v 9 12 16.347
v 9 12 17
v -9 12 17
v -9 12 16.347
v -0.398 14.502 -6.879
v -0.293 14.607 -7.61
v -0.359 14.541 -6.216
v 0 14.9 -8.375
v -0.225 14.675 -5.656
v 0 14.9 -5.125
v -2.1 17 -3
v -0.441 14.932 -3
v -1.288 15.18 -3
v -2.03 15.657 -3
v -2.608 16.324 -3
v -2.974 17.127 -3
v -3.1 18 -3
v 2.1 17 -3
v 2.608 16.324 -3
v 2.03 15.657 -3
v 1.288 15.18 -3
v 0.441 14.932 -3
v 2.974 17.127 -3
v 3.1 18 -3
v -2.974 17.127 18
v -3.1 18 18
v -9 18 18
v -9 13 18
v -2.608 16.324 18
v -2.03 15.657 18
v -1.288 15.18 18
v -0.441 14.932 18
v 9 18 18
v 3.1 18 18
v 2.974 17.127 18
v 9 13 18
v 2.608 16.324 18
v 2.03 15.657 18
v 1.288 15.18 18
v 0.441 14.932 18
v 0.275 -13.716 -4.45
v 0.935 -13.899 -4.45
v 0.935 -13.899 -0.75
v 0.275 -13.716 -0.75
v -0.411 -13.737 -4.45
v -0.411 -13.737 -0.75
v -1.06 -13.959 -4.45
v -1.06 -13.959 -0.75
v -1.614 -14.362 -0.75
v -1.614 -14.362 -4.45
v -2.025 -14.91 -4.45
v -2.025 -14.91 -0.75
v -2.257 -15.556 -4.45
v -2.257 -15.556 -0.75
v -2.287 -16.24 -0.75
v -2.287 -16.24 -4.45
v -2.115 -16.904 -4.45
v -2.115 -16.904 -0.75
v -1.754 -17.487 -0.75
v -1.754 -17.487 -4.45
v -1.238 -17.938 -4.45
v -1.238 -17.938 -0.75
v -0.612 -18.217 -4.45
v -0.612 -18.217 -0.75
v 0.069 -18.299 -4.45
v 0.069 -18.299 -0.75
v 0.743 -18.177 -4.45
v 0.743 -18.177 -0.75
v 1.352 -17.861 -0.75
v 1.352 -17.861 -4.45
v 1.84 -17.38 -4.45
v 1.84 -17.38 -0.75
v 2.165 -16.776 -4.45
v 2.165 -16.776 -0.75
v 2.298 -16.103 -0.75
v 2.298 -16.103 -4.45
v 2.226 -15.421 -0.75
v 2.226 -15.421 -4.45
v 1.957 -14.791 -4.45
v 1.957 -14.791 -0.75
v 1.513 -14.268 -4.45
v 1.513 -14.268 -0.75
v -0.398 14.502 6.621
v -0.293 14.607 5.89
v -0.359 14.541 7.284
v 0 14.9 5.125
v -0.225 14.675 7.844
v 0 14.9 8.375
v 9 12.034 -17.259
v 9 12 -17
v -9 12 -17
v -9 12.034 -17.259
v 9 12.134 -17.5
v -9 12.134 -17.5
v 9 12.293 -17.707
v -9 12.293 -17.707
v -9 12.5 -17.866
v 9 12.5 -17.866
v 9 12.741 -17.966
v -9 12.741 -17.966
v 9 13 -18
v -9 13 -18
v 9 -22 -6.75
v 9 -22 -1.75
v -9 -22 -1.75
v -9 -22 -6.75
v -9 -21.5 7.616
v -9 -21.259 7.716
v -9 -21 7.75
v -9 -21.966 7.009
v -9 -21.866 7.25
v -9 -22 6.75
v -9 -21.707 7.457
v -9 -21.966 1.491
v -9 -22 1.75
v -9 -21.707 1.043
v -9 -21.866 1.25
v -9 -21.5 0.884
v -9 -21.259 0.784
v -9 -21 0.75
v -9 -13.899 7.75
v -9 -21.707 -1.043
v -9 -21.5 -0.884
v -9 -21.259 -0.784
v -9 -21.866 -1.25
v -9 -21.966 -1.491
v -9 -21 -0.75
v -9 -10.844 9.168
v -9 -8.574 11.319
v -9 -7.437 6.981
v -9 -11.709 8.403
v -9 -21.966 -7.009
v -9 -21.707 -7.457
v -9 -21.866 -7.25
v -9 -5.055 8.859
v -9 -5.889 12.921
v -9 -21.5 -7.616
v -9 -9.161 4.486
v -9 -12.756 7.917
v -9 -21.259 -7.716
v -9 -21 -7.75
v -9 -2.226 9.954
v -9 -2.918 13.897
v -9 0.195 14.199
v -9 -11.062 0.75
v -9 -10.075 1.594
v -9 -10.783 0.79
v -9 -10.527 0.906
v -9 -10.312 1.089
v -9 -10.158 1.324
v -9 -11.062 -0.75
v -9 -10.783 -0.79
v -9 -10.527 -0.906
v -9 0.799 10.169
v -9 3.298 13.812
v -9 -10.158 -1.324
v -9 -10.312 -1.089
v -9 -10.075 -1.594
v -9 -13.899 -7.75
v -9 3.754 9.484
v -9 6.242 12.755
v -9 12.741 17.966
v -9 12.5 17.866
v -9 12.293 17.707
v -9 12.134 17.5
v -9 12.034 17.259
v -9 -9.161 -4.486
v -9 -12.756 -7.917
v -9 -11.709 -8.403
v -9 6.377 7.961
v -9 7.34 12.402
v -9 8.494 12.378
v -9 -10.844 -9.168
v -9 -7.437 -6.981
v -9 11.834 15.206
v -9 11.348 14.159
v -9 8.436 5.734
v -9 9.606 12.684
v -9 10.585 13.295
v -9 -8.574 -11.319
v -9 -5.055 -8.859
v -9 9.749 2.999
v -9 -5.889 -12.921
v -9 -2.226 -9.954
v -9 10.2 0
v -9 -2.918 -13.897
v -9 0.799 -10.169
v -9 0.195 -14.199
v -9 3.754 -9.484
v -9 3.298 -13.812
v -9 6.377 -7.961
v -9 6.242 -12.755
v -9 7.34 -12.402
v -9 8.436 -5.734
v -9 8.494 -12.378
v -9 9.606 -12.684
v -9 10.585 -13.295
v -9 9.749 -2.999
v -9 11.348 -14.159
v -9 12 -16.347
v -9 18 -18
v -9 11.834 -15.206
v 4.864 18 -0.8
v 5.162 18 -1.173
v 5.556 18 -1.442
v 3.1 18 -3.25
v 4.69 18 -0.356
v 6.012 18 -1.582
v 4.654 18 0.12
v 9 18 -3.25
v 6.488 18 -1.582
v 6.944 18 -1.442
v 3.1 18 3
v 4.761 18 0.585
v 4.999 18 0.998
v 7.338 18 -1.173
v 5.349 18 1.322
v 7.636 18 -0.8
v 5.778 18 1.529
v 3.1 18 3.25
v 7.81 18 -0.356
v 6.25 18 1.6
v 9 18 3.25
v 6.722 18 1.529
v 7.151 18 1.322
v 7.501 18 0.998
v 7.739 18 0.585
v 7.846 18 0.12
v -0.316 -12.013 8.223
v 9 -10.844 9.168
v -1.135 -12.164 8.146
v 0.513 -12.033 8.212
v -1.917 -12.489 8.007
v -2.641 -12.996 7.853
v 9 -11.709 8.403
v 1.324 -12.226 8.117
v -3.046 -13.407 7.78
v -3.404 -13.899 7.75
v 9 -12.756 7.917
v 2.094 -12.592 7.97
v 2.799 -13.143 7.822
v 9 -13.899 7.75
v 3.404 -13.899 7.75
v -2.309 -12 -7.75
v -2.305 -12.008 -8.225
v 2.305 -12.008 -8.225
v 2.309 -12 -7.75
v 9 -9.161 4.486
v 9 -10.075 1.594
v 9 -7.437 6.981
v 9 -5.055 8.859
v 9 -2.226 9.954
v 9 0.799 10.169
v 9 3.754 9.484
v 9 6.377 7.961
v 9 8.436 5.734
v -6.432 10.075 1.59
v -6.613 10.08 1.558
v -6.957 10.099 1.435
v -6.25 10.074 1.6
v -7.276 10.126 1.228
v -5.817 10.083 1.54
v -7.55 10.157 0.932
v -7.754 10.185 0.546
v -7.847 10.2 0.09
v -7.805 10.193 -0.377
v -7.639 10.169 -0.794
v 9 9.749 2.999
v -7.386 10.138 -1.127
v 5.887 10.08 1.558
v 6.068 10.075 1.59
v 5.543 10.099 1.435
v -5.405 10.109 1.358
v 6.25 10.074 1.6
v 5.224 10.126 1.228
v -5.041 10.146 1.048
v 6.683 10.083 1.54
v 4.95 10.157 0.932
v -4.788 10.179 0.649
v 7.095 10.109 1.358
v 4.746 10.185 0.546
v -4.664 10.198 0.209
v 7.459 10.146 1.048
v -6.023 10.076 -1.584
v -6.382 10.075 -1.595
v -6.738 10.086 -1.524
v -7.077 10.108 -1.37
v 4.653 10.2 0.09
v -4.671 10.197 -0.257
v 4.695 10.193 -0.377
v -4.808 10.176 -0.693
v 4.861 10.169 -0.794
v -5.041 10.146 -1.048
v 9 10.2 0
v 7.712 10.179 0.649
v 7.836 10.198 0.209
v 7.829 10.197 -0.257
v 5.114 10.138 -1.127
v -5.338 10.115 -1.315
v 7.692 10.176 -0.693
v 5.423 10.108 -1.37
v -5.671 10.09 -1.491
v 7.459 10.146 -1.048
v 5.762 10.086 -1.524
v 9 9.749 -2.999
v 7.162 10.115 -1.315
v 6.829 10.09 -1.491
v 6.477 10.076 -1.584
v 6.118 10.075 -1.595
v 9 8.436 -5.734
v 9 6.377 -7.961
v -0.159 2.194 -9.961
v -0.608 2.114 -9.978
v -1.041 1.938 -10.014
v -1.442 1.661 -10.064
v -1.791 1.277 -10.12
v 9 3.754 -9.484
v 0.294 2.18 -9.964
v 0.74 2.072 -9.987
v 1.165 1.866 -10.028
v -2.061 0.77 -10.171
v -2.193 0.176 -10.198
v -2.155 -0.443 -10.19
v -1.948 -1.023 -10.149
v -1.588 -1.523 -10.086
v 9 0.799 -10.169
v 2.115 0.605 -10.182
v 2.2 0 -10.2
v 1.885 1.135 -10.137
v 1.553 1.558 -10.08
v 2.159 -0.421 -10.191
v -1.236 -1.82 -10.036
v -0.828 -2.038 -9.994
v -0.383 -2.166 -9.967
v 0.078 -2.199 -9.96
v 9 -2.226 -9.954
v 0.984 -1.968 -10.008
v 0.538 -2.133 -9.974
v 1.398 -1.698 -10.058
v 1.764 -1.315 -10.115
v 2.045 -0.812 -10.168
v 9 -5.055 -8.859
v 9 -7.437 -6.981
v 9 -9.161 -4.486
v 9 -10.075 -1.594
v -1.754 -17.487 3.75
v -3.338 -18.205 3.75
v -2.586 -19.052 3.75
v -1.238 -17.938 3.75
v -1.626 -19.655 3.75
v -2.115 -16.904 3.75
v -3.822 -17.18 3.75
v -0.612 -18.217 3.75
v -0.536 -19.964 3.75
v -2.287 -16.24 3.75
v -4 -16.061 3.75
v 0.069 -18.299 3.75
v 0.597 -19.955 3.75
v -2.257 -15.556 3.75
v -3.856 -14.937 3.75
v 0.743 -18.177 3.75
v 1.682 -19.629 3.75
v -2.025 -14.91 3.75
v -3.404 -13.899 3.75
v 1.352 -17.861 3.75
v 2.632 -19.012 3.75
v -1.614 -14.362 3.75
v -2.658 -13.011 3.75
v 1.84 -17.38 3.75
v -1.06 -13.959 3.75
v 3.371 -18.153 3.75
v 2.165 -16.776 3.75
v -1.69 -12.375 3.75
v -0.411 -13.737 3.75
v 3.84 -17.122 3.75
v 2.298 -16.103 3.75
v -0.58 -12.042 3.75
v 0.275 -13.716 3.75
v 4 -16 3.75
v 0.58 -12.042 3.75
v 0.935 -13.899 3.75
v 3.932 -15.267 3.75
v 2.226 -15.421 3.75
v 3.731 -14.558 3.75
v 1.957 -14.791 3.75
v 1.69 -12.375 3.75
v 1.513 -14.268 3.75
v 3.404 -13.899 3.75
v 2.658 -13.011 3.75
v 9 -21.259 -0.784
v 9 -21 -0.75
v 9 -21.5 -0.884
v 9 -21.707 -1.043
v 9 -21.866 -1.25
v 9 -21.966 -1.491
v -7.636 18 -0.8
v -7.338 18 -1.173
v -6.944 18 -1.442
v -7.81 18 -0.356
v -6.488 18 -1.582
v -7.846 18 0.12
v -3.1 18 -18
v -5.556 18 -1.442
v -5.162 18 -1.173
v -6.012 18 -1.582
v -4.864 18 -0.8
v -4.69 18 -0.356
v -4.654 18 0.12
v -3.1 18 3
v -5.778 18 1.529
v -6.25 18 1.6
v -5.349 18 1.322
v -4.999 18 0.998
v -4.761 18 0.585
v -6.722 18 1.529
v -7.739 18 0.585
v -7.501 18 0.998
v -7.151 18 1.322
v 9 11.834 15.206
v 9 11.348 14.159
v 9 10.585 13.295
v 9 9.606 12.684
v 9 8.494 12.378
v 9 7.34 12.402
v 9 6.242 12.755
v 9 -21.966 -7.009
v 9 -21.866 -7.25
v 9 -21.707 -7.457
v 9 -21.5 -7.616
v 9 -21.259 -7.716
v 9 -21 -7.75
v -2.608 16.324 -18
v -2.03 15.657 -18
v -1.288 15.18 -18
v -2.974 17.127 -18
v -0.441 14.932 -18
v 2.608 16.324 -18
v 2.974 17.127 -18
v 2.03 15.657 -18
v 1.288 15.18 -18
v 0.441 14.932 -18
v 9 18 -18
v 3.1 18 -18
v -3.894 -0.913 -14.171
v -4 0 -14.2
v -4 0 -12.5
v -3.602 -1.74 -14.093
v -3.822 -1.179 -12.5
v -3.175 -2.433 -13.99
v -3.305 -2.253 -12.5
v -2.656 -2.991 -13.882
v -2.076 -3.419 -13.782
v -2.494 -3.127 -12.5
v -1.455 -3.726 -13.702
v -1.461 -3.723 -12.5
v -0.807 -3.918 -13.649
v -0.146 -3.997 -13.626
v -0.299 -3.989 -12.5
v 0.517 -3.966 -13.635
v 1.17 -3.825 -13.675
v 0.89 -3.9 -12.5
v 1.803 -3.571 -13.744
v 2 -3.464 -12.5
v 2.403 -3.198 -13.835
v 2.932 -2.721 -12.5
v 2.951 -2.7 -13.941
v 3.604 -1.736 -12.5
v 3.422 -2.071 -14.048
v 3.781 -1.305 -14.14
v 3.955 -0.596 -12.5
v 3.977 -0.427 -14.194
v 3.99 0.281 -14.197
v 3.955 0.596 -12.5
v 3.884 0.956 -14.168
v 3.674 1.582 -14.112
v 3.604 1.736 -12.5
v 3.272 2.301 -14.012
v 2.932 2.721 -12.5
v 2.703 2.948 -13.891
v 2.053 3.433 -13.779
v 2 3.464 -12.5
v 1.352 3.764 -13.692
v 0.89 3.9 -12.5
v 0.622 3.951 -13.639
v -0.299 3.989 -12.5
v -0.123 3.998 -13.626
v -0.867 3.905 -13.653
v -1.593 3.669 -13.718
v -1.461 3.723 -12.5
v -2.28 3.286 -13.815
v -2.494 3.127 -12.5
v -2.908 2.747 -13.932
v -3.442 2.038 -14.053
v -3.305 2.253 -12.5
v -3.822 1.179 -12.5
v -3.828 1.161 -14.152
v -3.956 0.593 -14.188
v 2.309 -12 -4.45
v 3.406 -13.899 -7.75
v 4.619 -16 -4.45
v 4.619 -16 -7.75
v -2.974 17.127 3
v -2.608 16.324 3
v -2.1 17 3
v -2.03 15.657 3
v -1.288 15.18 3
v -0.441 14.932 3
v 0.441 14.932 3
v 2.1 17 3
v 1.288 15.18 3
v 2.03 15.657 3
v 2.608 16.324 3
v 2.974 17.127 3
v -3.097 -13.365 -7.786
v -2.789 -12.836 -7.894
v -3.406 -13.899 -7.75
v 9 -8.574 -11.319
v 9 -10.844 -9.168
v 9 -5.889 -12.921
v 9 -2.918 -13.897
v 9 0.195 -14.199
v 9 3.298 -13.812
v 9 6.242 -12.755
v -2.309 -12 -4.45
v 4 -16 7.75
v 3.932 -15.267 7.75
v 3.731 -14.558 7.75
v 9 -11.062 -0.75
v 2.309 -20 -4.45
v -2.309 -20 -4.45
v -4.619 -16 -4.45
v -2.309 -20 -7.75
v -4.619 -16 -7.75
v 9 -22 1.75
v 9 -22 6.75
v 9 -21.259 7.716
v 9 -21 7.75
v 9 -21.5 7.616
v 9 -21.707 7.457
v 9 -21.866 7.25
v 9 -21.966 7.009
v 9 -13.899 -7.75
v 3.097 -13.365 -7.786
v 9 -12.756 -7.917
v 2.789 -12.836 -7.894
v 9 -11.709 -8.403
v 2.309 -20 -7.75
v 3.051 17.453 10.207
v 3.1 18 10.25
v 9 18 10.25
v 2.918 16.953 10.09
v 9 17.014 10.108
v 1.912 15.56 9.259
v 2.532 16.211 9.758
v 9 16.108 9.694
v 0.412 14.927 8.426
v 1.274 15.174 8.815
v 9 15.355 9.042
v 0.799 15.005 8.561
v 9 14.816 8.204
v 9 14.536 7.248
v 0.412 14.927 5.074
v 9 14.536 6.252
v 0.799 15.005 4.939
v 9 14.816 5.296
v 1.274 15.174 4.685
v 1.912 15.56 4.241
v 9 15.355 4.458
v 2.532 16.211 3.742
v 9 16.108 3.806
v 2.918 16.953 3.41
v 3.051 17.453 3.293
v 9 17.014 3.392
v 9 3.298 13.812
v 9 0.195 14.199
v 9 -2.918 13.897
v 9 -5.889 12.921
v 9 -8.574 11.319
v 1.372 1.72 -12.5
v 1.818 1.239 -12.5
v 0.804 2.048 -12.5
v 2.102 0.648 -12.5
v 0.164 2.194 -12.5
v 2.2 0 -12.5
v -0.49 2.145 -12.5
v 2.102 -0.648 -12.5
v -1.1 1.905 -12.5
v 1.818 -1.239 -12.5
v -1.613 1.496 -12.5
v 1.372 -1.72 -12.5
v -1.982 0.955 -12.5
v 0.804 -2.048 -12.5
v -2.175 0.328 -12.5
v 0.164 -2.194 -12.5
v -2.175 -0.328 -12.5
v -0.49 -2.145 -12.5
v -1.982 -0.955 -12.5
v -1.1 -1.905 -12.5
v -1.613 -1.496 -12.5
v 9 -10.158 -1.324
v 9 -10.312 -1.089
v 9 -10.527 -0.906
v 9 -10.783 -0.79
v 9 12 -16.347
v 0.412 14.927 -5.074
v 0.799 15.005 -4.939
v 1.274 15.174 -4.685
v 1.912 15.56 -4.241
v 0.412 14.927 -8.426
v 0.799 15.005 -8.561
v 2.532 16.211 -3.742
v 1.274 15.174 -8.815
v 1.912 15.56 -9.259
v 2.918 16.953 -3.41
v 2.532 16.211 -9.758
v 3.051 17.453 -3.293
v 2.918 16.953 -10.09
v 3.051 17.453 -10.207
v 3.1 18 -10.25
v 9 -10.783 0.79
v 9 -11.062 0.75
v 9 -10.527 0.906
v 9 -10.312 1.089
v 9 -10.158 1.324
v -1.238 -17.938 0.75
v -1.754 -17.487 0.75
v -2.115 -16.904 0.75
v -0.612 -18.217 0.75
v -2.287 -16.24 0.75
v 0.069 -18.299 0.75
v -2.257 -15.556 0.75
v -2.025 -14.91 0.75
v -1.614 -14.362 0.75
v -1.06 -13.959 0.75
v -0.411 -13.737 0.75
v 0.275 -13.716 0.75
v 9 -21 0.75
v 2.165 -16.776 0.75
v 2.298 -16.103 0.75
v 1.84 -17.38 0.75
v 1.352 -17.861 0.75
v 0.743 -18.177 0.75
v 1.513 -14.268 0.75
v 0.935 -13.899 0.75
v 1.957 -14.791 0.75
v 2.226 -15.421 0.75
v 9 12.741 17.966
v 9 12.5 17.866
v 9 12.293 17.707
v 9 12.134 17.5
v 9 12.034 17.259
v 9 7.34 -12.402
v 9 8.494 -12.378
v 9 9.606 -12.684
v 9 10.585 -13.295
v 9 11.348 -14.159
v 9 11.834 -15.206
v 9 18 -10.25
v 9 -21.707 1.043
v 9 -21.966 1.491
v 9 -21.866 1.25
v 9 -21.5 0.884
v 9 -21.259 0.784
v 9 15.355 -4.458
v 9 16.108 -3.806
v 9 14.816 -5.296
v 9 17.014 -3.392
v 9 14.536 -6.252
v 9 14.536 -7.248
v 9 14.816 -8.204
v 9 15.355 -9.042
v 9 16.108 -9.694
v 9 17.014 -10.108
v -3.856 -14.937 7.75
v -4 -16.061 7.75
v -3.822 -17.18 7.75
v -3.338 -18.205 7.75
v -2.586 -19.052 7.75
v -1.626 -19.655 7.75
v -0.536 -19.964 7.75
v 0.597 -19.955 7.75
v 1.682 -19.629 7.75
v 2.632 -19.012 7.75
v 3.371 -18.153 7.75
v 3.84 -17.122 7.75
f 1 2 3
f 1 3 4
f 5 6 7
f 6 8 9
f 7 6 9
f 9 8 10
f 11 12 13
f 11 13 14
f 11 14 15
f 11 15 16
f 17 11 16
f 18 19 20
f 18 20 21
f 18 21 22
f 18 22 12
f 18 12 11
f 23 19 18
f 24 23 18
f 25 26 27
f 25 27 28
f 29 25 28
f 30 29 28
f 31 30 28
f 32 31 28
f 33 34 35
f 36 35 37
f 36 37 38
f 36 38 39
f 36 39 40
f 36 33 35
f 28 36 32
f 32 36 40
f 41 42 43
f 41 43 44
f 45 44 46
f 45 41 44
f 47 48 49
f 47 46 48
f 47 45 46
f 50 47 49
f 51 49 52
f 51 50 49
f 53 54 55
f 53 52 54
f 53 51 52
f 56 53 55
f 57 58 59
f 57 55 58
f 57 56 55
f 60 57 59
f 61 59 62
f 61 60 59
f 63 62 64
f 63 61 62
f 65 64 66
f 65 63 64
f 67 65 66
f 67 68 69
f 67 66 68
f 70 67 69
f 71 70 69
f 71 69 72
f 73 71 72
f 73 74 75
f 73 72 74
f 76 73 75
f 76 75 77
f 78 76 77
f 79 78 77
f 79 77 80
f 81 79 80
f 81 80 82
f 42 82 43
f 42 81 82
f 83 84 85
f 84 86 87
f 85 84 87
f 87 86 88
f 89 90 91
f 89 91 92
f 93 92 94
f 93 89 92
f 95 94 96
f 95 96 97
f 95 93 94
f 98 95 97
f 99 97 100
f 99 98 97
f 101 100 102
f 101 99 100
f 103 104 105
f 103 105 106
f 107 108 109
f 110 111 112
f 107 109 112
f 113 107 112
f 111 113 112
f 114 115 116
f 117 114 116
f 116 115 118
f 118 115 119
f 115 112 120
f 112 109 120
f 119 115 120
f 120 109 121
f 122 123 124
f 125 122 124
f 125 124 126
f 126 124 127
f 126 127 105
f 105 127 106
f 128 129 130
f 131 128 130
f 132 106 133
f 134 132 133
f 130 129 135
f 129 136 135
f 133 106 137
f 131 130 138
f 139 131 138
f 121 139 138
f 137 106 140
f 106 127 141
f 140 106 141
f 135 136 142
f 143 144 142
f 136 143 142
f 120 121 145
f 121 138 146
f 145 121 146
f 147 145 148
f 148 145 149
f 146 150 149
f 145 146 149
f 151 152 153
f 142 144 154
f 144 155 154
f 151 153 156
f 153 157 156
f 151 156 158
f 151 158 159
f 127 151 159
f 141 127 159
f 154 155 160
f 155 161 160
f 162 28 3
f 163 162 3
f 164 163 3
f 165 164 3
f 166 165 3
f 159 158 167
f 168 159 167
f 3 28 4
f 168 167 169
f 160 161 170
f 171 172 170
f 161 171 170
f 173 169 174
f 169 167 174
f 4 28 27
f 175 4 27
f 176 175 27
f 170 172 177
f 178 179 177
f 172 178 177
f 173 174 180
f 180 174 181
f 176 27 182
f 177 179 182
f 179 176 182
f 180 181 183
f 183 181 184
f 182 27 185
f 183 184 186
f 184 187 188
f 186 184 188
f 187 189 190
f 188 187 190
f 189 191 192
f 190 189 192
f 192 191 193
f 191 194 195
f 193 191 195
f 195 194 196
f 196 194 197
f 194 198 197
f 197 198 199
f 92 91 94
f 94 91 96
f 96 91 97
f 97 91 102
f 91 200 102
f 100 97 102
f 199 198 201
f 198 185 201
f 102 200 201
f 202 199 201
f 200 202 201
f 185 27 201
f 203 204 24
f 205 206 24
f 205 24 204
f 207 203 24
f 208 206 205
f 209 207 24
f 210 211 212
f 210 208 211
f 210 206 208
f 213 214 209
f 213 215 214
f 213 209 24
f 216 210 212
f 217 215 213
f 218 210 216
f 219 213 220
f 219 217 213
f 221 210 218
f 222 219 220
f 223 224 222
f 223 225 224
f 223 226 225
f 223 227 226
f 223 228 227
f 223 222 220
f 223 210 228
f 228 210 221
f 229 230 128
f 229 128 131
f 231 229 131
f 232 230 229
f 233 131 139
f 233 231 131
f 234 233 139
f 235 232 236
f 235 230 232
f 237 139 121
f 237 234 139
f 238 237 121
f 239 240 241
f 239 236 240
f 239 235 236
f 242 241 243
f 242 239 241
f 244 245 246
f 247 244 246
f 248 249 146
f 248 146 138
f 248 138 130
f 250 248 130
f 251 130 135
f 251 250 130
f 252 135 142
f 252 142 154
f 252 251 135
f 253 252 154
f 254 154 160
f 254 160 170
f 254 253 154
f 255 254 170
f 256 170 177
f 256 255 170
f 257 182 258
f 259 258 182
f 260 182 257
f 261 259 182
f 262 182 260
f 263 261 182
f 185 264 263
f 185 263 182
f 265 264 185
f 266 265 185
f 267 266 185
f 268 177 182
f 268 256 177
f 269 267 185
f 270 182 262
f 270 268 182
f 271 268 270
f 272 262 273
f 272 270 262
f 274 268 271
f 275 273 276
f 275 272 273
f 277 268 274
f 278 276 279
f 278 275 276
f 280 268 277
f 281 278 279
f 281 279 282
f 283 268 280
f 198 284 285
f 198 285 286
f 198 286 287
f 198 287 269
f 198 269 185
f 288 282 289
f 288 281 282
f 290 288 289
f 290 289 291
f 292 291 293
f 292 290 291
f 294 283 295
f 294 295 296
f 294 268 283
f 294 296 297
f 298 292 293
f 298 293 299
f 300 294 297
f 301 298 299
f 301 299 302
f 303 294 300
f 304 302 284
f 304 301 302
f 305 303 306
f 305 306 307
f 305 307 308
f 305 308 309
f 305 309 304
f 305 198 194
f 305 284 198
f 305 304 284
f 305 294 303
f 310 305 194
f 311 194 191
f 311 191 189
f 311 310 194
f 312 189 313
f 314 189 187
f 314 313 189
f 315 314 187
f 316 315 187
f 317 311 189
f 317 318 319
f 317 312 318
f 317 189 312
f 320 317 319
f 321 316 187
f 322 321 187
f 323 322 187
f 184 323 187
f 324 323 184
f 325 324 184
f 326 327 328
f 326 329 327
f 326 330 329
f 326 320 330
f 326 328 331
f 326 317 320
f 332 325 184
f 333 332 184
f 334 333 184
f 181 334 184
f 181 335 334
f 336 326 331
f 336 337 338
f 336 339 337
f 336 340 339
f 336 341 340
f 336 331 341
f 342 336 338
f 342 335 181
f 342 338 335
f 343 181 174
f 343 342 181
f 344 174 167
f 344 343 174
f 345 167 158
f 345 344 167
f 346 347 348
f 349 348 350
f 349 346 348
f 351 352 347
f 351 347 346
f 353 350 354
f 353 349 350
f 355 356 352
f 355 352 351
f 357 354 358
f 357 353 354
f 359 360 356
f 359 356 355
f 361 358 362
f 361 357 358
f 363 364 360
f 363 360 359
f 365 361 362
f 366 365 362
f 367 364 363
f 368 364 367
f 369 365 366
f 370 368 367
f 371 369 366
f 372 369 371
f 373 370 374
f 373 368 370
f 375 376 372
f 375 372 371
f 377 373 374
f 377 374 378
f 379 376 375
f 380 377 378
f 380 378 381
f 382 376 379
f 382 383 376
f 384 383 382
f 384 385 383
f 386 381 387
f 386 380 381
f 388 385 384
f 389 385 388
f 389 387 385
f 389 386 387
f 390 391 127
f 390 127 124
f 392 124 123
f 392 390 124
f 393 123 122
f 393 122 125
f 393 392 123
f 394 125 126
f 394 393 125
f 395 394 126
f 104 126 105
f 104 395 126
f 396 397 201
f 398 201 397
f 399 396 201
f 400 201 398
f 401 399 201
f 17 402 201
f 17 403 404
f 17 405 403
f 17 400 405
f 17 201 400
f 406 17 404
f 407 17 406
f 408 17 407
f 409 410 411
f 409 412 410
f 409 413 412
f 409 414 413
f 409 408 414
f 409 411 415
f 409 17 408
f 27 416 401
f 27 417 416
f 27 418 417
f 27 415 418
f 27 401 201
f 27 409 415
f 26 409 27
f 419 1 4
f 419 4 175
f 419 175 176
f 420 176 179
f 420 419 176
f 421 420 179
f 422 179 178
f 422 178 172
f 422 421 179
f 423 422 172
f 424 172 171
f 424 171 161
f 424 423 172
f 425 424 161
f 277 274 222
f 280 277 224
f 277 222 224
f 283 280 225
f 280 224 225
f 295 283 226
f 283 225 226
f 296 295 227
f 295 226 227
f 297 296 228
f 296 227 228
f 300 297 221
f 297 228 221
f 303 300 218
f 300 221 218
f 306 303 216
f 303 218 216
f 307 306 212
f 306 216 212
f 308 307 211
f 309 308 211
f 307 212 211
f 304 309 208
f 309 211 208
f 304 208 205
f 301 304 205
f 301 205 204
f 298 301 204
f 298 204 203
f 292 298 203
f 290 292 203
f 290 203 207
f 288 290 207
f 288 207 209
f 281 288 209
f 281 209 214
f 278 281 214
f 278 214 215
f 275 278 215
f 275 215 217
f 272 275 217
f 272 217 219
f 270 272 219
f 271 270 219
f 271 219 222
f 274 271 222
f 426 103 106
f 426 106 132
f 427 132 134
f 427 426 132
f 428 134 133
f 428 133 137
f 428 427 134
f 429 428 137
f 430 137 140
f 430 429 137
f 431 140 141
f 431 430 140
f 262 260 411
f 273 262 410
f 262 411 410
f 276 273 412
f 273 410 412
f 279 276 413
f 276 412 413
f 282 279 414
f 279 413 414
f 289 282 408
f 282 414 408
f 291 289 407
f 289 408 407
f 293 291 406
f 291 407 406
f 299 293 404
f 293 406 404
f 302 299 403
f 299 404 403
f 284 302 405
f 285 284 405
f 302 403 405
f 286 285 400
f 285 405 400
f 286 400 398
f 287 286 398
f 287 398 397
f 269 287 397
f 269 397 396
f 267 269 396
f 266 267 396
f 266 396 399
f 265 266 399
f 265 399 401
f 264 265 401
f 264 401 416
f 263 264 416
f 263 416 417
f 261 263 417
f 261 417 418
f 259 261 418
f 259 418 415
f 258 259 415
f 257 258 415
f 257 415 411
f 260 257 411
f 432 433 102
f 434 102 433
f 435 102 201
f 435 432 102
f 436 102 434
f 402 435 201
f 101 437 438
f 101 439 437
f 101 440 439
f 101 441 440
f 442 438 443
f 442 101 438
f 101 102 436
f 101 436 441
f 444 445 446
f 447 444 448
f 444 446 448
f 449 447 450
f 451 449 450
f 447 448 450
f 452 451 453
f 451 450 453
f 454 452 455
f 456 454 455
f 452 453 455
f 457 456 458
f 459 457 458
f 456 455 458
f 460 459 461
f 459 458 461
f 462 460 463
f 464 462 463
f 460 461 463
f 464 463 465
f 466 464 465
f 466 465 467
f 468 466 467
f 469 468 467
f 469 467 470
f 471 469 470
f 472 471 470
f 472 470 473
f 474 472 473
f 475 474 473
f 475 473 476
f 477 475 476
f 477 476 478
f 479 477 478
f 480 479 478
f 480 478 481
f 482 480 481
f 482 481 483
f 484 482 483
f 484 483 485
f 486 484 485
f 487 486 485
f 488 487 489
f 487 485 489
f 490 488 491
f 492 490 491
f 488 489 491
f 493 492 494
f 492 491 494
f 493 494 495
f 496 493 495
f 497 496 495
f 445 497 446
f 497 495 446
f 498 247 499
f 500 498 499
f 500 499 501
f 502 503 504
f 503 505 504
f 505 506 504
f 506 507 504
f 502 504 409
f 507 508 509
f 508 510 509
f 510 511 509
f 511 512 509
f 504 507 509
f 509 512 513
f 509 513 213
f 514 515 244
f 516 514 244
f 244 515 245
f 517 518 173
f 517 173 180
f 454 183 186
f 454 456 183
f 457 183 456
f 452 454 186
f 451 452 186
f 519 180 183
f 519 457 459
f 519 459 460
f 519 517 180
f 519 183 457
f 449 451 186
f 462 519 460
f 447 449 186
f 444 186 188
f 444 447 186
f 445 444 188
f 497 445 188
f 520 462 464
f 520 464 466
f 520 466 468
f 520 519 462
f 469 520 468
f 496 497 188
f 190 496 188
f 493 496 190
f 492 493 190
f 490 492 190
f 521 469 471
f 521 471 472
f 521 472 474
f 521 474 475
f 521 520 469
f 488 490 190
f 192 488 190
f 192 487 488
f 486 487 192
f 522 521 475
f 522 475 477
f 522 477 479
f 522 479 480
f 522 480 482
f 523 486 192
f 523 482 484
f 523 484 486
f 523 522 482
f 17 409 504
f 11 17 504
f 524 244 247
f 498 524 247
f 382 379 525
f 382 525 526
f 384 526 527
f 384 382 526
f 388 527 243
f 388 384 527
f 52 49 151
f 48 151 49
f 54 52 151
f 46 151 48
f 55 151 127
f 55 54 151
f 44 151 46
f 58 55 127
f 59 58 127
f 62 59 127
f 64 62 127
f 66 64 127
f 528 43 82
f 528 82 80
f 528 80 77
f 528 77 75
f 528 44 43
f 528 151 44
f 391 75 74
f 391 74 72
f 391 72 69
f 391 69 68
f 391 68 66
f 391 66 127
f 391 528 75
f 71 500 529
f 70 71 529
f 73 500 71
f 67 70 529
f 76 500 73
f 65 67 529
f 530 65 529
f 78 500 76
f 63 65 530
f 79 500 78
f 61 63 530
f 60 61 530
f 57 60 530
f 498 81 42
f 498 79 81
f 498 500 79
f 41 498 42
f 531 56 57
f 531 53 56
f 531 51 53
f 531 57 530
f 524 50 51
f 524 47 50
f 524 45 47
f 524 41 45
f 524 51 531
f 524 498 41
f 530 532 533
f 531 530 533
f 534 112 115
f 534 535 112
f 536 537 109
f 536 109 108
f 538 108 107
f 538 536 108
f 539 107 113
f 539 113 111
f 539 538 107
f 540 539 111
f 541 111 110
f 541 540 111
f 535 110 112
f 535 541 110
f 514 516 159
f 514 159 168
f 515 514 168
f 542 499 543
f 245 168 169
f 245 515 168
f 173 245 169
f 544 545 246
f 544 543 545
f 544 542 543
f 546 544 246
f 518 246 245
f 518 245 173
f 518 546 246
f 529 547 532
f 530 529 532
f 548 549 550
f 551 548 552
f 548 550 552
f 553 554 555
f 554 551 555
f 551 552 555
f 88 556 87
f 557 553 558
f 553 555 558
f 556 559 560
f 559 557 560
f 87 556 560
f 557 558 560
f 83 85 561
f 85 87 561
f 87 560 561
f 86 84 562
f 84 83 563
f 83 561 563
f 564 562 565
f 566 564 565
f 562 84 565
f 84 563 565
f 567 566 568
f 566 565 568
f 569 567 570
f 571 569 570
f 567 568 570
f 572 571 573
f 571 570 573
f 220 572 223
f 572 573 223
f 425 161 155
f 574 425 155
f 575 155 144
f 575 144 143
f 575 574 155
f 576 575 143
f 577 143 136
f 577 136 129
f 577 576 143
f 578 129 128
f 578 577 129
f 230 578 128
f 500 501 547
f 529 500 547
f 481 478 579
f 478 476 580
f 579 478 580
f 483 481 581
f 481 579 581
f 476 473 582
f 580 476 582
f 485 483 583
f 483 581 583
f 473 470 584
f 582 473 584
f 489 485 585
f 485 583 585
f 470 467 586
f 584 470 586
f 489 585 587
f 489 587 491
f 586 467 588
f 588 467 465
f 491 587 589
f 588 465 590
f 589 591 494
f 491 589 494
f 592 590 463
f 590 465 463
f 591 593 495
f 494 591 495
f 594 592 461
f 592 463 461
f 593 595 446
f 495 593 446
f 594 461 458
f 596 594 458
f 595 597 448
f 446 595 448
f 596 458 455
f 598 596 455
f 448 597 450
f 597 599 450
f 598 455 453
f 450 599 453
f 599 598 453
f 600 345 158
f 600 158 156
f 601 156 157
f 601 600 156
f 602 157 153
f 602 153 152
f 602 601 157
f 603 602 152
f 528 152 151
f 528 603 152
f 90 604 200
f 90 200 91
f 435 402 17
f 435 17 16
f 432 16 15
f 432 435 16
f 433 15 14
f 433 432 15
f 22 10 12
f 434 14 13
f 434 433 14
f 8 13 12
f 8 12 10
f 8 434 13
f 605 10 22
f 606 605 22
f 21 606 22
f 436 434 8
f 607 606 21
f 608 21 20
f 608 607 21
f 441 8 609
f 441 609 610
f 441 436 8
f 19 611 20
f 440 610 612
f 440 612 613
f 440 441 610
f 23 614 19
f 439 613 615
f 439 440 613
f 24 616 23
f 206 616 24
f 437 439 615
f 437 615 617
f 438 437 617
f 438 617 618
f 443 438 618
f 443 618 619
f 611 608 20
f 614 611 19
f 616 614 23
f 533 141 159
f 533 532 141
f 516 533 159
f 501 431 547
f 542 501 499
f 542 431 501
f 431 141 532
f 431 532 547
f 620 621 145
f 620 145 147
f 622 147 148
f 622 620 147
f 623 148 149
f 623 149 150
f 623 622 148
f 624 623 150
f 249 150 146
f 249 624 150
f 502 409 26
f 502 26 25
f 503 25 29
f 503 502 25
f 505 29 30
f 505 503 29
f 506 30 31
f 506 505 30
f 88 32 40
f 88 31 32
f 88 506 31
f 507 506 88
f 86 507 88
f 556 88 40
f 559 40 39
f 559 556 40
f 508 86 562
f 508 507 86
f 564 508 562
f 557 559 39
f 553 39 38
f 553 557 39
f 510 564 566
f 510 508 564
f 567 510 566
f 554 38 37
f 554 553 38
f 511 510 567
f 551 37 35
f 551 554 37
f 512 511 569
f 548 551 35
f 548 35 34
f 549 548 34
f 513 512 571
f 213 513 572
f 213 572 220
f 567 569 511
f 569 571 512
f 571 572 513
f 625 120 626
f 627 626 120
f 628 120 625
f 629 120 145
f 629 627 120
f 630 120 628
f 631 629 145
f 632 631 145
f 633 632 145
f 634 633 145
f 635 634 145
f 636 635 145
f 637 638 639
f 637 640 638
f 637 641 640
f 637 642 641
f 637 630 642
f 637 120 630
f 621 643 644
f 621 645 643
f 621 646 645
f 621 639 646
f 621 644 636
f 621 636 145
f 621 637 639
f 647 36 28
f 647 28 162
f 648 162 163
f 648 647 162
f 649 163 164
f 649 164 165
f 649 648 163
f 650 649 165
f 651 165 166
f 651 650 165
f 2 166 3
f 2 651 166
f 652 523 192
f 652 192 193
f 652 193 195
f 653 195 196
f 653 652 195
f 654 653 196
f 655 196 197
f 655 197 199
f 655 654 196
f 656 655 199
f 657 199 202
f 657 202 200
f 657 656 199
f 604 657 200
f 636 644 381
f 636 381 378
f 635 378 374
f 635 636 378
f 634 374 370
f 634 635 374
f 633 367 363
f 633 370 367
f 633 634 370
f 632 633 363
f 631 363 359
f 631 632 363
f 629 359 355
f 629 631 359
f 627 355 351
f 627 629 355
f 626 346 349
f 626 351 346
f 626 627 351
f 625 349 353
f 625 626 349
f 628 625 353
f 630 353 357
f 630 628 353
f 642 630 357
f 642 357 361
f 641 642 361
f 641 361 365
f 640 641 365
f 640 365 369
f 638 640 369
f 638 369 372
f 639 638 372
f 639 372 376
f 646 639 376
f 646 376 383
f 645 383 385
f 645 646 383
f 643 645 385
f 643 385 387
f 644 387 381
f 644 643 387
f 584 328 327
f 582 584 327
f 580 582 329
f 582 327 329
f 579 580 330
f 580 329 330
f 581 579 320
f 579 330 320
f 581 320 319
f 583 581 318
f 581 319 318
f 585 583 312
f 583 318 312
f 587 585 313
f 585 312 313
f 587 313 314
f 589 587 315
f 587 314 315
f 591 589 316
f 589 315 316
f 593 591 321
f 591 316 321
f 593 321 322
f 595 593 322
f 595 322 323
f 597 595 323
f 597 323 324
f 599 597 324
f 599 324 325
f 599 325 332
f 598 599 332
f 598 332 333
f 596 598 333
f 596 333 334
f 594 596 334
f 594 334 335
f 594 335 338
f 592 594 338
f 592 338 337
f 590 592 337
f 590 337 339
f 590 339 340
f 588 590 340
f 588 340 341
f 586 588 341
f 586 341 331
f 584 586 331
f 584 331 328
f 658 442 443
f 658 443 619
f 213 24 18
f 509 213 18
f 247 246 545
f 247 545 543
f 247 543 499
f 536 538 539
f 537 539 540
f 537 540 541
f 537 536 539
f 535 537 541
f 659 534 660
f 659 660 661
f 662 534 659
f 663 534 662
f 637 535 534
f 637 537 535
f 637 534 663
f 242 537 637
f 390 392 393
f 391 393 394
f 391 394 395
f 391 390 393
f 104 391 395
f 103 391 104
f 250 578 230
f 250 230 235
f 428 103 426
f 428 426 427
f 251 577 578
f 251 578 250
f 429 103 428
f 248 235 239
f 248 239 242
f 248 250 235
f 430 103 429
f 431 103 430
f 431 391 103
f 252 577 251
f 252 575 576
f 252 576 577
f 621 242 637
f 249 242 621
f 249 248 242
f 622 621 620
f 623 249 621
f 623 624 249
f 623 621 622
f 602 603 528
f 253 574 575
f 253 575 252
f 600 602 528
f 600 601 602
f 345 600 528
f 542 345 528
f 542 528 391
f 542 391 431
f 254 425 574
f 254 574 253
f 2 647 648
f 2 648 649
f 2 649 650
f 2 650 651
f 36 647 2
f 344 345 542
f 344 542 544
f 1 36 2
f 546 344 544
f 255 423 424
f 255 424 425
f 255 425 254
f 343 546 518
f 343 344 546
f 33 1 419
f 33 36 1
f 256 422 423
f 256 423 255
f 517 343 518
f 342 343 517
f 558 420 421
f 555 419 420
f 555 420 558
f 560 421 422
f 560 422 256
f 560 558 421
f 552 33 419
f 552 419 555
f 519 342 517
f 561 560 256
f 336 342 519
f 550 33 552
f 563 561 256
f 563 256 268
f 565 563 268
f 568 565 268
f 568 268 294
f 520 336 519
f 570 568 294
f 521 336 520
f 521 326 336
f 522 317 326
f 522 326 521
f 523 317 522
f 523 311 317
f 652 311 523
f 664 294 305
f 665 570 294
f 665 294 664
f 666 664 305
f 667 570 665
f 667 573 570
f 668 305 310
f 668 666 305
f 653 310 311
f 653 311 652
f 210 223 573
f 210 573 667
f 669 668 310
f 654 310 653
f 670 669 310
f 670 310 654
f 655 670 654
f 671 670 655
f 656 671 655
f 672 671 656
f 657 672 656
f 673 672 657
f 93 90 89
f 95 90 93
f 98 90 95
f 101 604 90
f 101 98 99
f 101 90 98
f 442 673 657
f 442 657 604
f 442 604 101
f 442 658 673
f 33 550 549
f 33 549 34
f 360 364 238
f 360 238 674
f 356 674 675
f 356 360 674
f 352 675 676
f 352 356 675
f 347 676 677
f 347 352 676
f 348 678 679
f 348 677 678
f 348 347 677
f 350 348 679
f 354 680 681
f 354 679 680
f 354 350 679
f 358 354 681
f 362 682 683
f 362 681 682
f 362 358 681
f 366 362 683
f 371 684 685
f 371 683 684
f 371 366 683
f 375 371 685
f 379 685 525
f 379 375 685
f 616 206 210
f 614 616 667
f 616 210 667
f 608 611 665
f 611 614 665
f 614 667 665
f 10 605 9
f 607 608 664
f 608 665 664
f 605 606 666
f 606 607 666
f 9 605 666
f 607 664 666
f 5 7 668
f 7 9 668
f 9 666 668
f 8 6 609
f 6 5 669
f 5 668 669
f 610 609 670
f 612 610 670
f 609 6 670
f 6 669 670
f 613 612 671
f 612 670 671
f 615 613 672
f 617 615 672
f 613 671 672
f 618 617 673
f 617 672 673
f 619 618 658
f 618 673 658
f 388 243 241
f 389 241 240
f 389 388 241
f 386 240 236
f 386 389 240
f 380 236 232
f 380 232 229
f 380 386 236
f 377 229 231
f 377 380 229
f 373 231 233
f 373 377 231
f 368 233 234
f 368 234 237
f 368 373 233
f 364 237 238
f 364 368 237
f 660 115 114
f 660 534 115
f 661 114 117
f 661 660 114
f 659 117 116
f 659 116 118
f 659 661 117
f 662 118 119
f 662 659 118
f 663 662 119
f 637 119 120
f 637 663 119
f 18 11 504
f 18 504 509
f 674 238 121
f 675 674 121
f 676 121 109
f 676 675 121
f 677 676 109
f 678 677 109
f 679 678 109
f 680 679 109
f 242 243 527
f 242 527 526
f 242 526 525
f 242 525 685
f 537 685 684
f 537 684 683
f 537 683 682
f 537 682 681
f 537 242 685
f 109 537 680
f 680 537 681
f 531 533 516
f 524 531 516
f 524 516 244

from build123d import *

# Parameters (mm, degrees)
EXTRUDE_1_DEPTH               = 9
CUT_EXTRUDE_1_DEPTH           = 30.816103032
CUT_EXTRUDE_1_DEPTH_BACK      = 30.816103032
SKETCH_2_R                    = 2.3
CUT_EXTRUDE_2_DEPTH           = 3.3
CUT_EXTRUDE_2_OTHER_WAY_DEPTH = 36.043722716
CUT_EXTRUDE_2_OTHER_WAY_TAPER = 1
CUT_EXTRUDE_3_DEPTH           = 36.043722716
CUT_EXTRUDE_3_DEPTH_BACK      = 4
CUT_EXTRUDE_4_REACH           = 46.777
CUT_EXTRUDE_4_END_RADIUS      = 10.2
SKETCH_5_R                    = 1.6
EXTRUDE_2_DEPTH               = 3
SKETCH_7_W                    = 6.2
SKETCH_7_H                    = 6
CUT_EXTRUDE_6_DEPTH           = 1
CHAMFER_3_SIZE                = 1
CUT_EXTRUDE_8_REACH           = 35.645
SKETCH_9_R                    = 2.2
CUT_EXTRUDE_9_DEPTH           = 30.816103122
CUT_EXTRUDE_START             = 5.5
SKETCH_10_R                   = 4
SKETCH_10_R_2                 = 2.2
CUT_EXTRUDE_10_DEPTH          = 5.5


with BuildPart() as part:
    # Эскиз1 → Бобышка-Вытянуть1 (new, symmetric)
    with BuildSketch(Plane(origin=(0, 0, 0), x_dir=(0, 0, -1), z_dir=(1, 0, 0))):
        with BuildLine():
            Line((-0.75, -21), (-0.75, -11.06243644))
            ThreePointArc((-0.75, -11.06243644), (-0.989654684, -10.412917388), (-1.59375, -10.074718901))
            ThreePointArc((-1.59375, -10.074718901), (0, 10.2), (1.59375, -10.074718901))
            ThreePointArc((1.59375, -10.074718901), (0.989654684, -10.412917388), (0.75, -11.06243644))
            Line((0.75, -11.06243644), (0.75, -21))
            ThreePointArc((0.75, -21), (1.042893219, -21.707106781), (1.75, -22))
            Line((1.75, -22), (6.75, -22))
            ThreePointArc((6.75, -22), (7.457106781, -21.707106781), (7.75, -21))
            Line((7.75, -21), (7.75, -13.898830886))
            ThreePointArc((7.75, -13.898830886), (8.121662204, -12.215036114), (9.167582418, -10.844142779))
            ThreePointArc((9.167582418, -10.844142779), (13.897042702, -2.917568189), (12.75462481, 6.241758242))
            ThreePointArc((12.75462481, 6.241758242), (12.953882386, 10.117431577), (16.34747687, 12))
            Line((16.34747687, 12), (17, 12))
            ThreePointArc((17, 12), (17.707106781, 12.292893219), (18, 13))
            Line((18, 13), (18, 18))
            Line((18, 18), (-18, 18))
            Line((-18, 18), (-18, 13))
            ThreePointArc((-18, 13), (-17.707106781, 12.292893219), (-17, 12))
            Line((-17, 12), (-16.34747687, 12))
            ThreePointArc((-16.34747687, 12), (-12.953882386, 10.117431577), (-12.75462481, 6.241758242))
            ThreePointArc((-12.75462481, 6.241758242), (-13.897042702, -2.917568189), (-9.167582418, -10.844142779))
            ThreePointArc((-9.167582418, -10.844142779), (-8.121662204, -12.215036114), (-7.75, -13.898830886))
            Line((-7.75, -13.898830886), (-7.75, -21))
            ThreePointArc((-7.75, -21), (-7.457106781, -21.707106781), (-6.75, -22))
            Line((-6.75, -22), (-1.75, -22))
            ThreePointArc((-1.75, -22), (-1.042893219, -21.707106781), (-0.75, -21))
        make_face()
    extrude(amount=EXTRUDE_1_DEPTH, both=True)

    # Эскиз2 → Вырез-Вытянуть1 (cut, two sides: drawn at the far end of the back side and taken through both)
    with BuildSketch(Plane.XY.offset(-CUT_EXTRUDE_1_DEPTH_BACK)):
        with BuildLine():
            ThreePointArc((-3.1, 18), (0, 14.9), (3.1, 18))
            Line((3.1, 18), (-3.1, 18))
        make_face()
        with Locations(Location((0, -16, 0), (0, 0, 66.000891847))):
            Circle(SKETCH_2_R)
    extrude(amount=CUT_EXTRUDE_1_DEPTH + CUT_EXTRUDE_1_DEPTH_BACK, mode=Mode.SUBTRACT)

    # Эскиз3 → Вырез-Вытянуть2 (cut)
    with BuildSketch(Plane(origin=(0, 0, -7.75), x_dir=(-1, 0, 0), z_dir=(0, 0, -1))):
        Polygon((-4.618802154, -16), (-2.309401077, -20), (2.309401077, -20), (4.618802154, -16), (2.309401077, -12), (-2.309401077, -12), align=None)
    extrude(amount=-CUT_EXTRUDE_2_DEPTH, mode=Mode.SUBTRACT)

    # Эскиз3 → Вырез-Вытянуть2 other way (cut)
    with BuildSketch(Plane(origin=(0, 0, -7.75), x_dir=(-1, 0, 0), z_dir=(0, 0, -1))):
        Polygon((-4.618802154, -16), (-2.309401077, -20), (2.309401077, -20), (4.618802154, -16), (2.309401077, -12), (-2.309401077, -12), align=None)
    extrude(amount=CUT_EXTRUDE_2_OTHER_WAY_DEPTH, taper=CUT_EXTRUDE_2_OTHER_WAY_TAPER, mode=Mode.SUBTRACT)

    # Эскиз4 → Вырез-Вытянуть3 (cut, two sides: drawn at the far end of the back side and taken through both)
    with BuildSketch(Plane.XY.offset(7.75).offset(-CUT_EXTRUDE_3_DEPTH_BACK)):
        with BuildLine():
            Line((-3.403687464, -13.898830886), (-0.935461573, -13.898830886))
            ThreePointArc((-0.935461573, -13.898830886), (0, -18.3), (0.935461573, -13.898830886))
            Line((0.935461573, -13.898830886), (3.403687464, -13.898830886))
            ThreePointArc((3.403687464, -13.898830886), (0, -12), (-3.403687464, -13.898830886))
        make_face()
        with BuildLine():
            ThreePointArc((0.935461573, -13.898830886), (0, -18.3), (-0.935461573, -13.898830886))
            Line((-0.935461573, -13.898830886), (-3.403687464, -13.898830886))
            ThreePointArc((-3.403687464, -13.898830886), (-1.092073748, -19.848035204), (4, -16))
            ThreePointArc((4, -16), (3.848035204, -14.907926252), (3.403687464, -13.898830886))
            Line((3.403687464, -13.898830886), (0.935461573, -13.898830886))
        make_face()
        with BuildLine():
            Line((-3.403687464, -13.898830886), (-0.935461573, -13.898830886))
            ThreePointArc((-0.935461573, -13.898830886), (0, -18.3), (0.935461573, -13.898830886))
            Line((0.935461573, -13.898830886), (3.403687464, -13.898830886))
            ThreePointArc((3.403687464, -13.898830886), (0, -12), (-3.403687464, -13.898830886))
        make_face()
        with BuildLine():
            ThreePointArc((0.935461573, -13.898830886), (0, -18.3), (-0.935461573, -13.898830886))
            Line((-0.935461573, -13.898830886), (-3.403687464, -13.898830886))
            ThreePointArc((-3.403687464, -13.898830886), (-1.092073748, -19.848035204), (4, -16))
            ThreePointArc((4, -16), (3.848035204, -14.907926252), (3.403687464, -13.898830886))
            Line((3.403687464, -13.898830886), (0.935461573, -13.898830886))
        make_face()
    extrude(amount=CUT_EXTRUDE_3_DEPTH + CUT_EXTRUDE_3_DEPTH_BACK, mode=Mode.SUBTRACT)

    # Вырез-Вытянуть4: up to this cylinder (the profile starts outside it)
    cut_extrude_4_end = Plane(origin=(0, 0, 0), z_dir=(-1, 0, 0)) * Cylinder(CUT_EXTRUDE_4_END_RADIUS, 127.454, mode=Mode.PRIVATE)
    # Эскиз5 → Вырез-Вытянуть4 (cut, up to the surface)
    with BuildSketch(Plane(origin=(0, 18, 0), x_dir=(1, 0, 0), z_dir=(0, 1, 0)), mode=Mode.PRIVATE) as cut_extrude_4_sk1:
        with Locations(Location((6.25, 0, 0), (0, 0, 270))):
            Circle(SKETCH_5_R)
    cut_extrude_4_tool1 = extrude(cut_extrude_4_sk1.sketch, amount=-CUT_EXTRUDE_4_REACH, mode=Mode.PRIVATE) - cut_extrude_4_end
    add(cut_extrude_4_tool1.solids().sort_by_distance((6.25, 18, 0))[0], mode=Mode.SUBTRACT)
    # Эскиз5 → Вырез-Вытянуть4 (cut, up to the surface)
    with BuildSketch(Plane(origin=(0, 18, 0), x_dir=(1, 0, 0), z_dir=(0, 1, 0)), mode=Mode.PRIVATE) as cut_extrude_4_sk2:
        with Locations(Location((-6.25, 0, 0), (0, 0, 270))):
            Circle(SKETCH_5_R)
    cut_extrude_4_tool2 = extrude(cut_extrude_4_sk2.sketch, amount=-CUT_EXTRUDE_4_REACH, mode=Mode.PRIVATE) - cut_extrude_4_end
    add(cut_extrude_4_tool2.solids().sort_by_distance((-6.25, 18, 0))[0], mode=Mode.SUBTRACT)

    # Эскиз6 → Бобышка-Вытянуть2 (add, symmetric)
    with BuildSketch(Plane.XY):
        with BuildLine():
            Line((-3.1, 18), (3.1, 18))
            ThreePointArc((3.1, 18), (0, 14.9), (-3.1, 18))
        make_face()
    extrude(amount=EXTRUDE_2_DEPTH, both=True)

    # Эскиз7 → Вырез-Вытянуть6 (cut)
    with BuildSketch(Plane(origin=(0, 18, 0), x_dir=(1, 0, 0), z_dir=(0, 1, 0))):
        Rectangle(SKETCH_7_W, SKETCH_7_H)
    extrude(amount=-CUT_EXTRUDE_6_DEPTH, mode=Mode.SUBTRACT)

    # Фаска3
    # the kernel refuses this chamfer: 1 mm, written as the material it adds along each edge
    with BuildSketch(Plane(origin=(3.1, 17, -3), x_dir=(0.02749587661058651, 0.9996219169112968, 0), z_dir=(0, 0, 1))) as chamfer_3_piece_1_section:
        Polygon((CHAMFER_3_SIZE * 0.999621916911, CHAMFER_3_SIZE * 0.0274958766106), (-CHAMFER_3_SIZE * 0.0274958766106, CHAMFER_3_SIZE * 0.999621916911), (0, 0), align=None)
    chamfer_3_piece_1 = extrude(amount=6, mode=Mode.PRIVATE)
    chamfer_3_piece_1 = split(chamfer_3_piece_1, bisect_by=Plane(origin=(2.769595846, 18, 0), z_dir=(0, -1, 0)), keep=Keep.TOP, mode=Mode.PRIVATE)
    add(chamfer_3_piece_1)
    with BuildSketch(Plane(origin=(-3.1, 17, 3), x_dir=(-0.02749587661058651, 0.9996219169112968, 0), z_dir=(0, 0, -1))) as chamfer_3_piece_2_section:
        Polygon((CHAMFER_3_SIZE * 0.999621916911, CHAMFER_3_SIZE * 0.0274958766106), (-CHAMFER_3_SIZE * 0.0274958766106, CHAMFER_3_SIZE * 0.999621916911), (0, 0), align=None)
    chamfer_3_piece_2 = extrude(amount=6, mode=Mode.PRIVATE)
    chamfer_3_piece_2 = split(chamfer_3_piece_2, bisect_by=Plane(origin=(-2.769595846, 18, 0), z_dir=(0, -1, 0)), keep=Keep.TOP, mode=Mode.PRIVATE)
    add(chamfer_3_piece_2)

    # Вырез-Вытянуть8: up to this plane
    cut_extrude_8_end = Plane(origin=(3.1, 18, 0), z_dir=(-0.7071067811865525, 0.7071067811865426, 0))
    # Эскиз8 → Вырез-Вытянуть8 (cut, up to the surface)
    with BuildSketch(Plane(origin=(9, 0, 0), x_dir=(0, 0, -1), z_dir=(1, 0, 0)), mode=Mode.PRIVATE) as cut_extrude_8_sk1:
        with BuildLine():
            ThreePointArc((-10.25, 18), (-6.75, 14.5), (-3.25, 18))
            Line((-3.25, 18), (-10.25, 18))
        make_face()
    cut_extrude_8_tool1 = split(extrude(cut_extrude_8_sk1.sketch, amount=-CUT_EXTRUDE_8_REACH, mode=Mode.PRIVATE), bisect_by=cut_extrude_8_end, keep=Keep.BOTH, mode=Mode.PRIVATE)
    add(cut_extrude_8_tool1.solids().sort_by_distance((9, 16.514554, 6.75))[0], mode=Mode.SUBTRACT)
    # Эскиз8 → Вырез-Вытянуть8 (cut, up to the surface)
    with BuildSketch(Plane(origin=(9, 0, 0), x_dir=(0, 0, -1), z_dir=(1, 0, 0)), mode=Mode.PRIVATE) as cut_extrude_8_sk2:
        with BuildLine():
            ThreePointArc((3.25, 18), (6.75, 14.5), (10.25, 18))
            Line((10.25, 18), (3.25, 18))
        make_face()
    cut_extrude_8_tool2 = split(extrude(cut_extrude_8_sk2.sketch, amount=-CUT_EXTRUDE_8_REACH, mode=Mode.PRIVATE), bisect_by=cut_extrude_8_end, keep=Keep.BOTH, mode=Mode.PRIVATE)
    add(cut_extrude_8_tool2.solids().sort_by_distance((9, 16.514554, -6.75))[0], mode=Mode.SUBTRACT)

    # Эскиз9 → Вырез-Вытянуть9 (cut, through all)
    with BuildSketch(Plane.XY):
        Circle(SKETCH_9_R)
    extrude(amount=-CUT_EXTRUDE_9_DEPTH, mode=Mode.SUBTRACT)

    # Эскиз10 → Вырез-Вытянуть10 (cut)
    with BuildSketch(Plane.XY.offset(-18).offset(CUT_EXTRUDE_START)):
        with Locations(Location((0, 0, 0), (0, 0, 180))):
            Circle(SKETCH_10_R)
        Circle(SKETCH_10_R_2, mode=Mode.SUBTRACT)
    extrude(amount=-CUT_EXTRUDE_10_DEPTH, mode=Mode.SUBTRACT)


solid = part.part
